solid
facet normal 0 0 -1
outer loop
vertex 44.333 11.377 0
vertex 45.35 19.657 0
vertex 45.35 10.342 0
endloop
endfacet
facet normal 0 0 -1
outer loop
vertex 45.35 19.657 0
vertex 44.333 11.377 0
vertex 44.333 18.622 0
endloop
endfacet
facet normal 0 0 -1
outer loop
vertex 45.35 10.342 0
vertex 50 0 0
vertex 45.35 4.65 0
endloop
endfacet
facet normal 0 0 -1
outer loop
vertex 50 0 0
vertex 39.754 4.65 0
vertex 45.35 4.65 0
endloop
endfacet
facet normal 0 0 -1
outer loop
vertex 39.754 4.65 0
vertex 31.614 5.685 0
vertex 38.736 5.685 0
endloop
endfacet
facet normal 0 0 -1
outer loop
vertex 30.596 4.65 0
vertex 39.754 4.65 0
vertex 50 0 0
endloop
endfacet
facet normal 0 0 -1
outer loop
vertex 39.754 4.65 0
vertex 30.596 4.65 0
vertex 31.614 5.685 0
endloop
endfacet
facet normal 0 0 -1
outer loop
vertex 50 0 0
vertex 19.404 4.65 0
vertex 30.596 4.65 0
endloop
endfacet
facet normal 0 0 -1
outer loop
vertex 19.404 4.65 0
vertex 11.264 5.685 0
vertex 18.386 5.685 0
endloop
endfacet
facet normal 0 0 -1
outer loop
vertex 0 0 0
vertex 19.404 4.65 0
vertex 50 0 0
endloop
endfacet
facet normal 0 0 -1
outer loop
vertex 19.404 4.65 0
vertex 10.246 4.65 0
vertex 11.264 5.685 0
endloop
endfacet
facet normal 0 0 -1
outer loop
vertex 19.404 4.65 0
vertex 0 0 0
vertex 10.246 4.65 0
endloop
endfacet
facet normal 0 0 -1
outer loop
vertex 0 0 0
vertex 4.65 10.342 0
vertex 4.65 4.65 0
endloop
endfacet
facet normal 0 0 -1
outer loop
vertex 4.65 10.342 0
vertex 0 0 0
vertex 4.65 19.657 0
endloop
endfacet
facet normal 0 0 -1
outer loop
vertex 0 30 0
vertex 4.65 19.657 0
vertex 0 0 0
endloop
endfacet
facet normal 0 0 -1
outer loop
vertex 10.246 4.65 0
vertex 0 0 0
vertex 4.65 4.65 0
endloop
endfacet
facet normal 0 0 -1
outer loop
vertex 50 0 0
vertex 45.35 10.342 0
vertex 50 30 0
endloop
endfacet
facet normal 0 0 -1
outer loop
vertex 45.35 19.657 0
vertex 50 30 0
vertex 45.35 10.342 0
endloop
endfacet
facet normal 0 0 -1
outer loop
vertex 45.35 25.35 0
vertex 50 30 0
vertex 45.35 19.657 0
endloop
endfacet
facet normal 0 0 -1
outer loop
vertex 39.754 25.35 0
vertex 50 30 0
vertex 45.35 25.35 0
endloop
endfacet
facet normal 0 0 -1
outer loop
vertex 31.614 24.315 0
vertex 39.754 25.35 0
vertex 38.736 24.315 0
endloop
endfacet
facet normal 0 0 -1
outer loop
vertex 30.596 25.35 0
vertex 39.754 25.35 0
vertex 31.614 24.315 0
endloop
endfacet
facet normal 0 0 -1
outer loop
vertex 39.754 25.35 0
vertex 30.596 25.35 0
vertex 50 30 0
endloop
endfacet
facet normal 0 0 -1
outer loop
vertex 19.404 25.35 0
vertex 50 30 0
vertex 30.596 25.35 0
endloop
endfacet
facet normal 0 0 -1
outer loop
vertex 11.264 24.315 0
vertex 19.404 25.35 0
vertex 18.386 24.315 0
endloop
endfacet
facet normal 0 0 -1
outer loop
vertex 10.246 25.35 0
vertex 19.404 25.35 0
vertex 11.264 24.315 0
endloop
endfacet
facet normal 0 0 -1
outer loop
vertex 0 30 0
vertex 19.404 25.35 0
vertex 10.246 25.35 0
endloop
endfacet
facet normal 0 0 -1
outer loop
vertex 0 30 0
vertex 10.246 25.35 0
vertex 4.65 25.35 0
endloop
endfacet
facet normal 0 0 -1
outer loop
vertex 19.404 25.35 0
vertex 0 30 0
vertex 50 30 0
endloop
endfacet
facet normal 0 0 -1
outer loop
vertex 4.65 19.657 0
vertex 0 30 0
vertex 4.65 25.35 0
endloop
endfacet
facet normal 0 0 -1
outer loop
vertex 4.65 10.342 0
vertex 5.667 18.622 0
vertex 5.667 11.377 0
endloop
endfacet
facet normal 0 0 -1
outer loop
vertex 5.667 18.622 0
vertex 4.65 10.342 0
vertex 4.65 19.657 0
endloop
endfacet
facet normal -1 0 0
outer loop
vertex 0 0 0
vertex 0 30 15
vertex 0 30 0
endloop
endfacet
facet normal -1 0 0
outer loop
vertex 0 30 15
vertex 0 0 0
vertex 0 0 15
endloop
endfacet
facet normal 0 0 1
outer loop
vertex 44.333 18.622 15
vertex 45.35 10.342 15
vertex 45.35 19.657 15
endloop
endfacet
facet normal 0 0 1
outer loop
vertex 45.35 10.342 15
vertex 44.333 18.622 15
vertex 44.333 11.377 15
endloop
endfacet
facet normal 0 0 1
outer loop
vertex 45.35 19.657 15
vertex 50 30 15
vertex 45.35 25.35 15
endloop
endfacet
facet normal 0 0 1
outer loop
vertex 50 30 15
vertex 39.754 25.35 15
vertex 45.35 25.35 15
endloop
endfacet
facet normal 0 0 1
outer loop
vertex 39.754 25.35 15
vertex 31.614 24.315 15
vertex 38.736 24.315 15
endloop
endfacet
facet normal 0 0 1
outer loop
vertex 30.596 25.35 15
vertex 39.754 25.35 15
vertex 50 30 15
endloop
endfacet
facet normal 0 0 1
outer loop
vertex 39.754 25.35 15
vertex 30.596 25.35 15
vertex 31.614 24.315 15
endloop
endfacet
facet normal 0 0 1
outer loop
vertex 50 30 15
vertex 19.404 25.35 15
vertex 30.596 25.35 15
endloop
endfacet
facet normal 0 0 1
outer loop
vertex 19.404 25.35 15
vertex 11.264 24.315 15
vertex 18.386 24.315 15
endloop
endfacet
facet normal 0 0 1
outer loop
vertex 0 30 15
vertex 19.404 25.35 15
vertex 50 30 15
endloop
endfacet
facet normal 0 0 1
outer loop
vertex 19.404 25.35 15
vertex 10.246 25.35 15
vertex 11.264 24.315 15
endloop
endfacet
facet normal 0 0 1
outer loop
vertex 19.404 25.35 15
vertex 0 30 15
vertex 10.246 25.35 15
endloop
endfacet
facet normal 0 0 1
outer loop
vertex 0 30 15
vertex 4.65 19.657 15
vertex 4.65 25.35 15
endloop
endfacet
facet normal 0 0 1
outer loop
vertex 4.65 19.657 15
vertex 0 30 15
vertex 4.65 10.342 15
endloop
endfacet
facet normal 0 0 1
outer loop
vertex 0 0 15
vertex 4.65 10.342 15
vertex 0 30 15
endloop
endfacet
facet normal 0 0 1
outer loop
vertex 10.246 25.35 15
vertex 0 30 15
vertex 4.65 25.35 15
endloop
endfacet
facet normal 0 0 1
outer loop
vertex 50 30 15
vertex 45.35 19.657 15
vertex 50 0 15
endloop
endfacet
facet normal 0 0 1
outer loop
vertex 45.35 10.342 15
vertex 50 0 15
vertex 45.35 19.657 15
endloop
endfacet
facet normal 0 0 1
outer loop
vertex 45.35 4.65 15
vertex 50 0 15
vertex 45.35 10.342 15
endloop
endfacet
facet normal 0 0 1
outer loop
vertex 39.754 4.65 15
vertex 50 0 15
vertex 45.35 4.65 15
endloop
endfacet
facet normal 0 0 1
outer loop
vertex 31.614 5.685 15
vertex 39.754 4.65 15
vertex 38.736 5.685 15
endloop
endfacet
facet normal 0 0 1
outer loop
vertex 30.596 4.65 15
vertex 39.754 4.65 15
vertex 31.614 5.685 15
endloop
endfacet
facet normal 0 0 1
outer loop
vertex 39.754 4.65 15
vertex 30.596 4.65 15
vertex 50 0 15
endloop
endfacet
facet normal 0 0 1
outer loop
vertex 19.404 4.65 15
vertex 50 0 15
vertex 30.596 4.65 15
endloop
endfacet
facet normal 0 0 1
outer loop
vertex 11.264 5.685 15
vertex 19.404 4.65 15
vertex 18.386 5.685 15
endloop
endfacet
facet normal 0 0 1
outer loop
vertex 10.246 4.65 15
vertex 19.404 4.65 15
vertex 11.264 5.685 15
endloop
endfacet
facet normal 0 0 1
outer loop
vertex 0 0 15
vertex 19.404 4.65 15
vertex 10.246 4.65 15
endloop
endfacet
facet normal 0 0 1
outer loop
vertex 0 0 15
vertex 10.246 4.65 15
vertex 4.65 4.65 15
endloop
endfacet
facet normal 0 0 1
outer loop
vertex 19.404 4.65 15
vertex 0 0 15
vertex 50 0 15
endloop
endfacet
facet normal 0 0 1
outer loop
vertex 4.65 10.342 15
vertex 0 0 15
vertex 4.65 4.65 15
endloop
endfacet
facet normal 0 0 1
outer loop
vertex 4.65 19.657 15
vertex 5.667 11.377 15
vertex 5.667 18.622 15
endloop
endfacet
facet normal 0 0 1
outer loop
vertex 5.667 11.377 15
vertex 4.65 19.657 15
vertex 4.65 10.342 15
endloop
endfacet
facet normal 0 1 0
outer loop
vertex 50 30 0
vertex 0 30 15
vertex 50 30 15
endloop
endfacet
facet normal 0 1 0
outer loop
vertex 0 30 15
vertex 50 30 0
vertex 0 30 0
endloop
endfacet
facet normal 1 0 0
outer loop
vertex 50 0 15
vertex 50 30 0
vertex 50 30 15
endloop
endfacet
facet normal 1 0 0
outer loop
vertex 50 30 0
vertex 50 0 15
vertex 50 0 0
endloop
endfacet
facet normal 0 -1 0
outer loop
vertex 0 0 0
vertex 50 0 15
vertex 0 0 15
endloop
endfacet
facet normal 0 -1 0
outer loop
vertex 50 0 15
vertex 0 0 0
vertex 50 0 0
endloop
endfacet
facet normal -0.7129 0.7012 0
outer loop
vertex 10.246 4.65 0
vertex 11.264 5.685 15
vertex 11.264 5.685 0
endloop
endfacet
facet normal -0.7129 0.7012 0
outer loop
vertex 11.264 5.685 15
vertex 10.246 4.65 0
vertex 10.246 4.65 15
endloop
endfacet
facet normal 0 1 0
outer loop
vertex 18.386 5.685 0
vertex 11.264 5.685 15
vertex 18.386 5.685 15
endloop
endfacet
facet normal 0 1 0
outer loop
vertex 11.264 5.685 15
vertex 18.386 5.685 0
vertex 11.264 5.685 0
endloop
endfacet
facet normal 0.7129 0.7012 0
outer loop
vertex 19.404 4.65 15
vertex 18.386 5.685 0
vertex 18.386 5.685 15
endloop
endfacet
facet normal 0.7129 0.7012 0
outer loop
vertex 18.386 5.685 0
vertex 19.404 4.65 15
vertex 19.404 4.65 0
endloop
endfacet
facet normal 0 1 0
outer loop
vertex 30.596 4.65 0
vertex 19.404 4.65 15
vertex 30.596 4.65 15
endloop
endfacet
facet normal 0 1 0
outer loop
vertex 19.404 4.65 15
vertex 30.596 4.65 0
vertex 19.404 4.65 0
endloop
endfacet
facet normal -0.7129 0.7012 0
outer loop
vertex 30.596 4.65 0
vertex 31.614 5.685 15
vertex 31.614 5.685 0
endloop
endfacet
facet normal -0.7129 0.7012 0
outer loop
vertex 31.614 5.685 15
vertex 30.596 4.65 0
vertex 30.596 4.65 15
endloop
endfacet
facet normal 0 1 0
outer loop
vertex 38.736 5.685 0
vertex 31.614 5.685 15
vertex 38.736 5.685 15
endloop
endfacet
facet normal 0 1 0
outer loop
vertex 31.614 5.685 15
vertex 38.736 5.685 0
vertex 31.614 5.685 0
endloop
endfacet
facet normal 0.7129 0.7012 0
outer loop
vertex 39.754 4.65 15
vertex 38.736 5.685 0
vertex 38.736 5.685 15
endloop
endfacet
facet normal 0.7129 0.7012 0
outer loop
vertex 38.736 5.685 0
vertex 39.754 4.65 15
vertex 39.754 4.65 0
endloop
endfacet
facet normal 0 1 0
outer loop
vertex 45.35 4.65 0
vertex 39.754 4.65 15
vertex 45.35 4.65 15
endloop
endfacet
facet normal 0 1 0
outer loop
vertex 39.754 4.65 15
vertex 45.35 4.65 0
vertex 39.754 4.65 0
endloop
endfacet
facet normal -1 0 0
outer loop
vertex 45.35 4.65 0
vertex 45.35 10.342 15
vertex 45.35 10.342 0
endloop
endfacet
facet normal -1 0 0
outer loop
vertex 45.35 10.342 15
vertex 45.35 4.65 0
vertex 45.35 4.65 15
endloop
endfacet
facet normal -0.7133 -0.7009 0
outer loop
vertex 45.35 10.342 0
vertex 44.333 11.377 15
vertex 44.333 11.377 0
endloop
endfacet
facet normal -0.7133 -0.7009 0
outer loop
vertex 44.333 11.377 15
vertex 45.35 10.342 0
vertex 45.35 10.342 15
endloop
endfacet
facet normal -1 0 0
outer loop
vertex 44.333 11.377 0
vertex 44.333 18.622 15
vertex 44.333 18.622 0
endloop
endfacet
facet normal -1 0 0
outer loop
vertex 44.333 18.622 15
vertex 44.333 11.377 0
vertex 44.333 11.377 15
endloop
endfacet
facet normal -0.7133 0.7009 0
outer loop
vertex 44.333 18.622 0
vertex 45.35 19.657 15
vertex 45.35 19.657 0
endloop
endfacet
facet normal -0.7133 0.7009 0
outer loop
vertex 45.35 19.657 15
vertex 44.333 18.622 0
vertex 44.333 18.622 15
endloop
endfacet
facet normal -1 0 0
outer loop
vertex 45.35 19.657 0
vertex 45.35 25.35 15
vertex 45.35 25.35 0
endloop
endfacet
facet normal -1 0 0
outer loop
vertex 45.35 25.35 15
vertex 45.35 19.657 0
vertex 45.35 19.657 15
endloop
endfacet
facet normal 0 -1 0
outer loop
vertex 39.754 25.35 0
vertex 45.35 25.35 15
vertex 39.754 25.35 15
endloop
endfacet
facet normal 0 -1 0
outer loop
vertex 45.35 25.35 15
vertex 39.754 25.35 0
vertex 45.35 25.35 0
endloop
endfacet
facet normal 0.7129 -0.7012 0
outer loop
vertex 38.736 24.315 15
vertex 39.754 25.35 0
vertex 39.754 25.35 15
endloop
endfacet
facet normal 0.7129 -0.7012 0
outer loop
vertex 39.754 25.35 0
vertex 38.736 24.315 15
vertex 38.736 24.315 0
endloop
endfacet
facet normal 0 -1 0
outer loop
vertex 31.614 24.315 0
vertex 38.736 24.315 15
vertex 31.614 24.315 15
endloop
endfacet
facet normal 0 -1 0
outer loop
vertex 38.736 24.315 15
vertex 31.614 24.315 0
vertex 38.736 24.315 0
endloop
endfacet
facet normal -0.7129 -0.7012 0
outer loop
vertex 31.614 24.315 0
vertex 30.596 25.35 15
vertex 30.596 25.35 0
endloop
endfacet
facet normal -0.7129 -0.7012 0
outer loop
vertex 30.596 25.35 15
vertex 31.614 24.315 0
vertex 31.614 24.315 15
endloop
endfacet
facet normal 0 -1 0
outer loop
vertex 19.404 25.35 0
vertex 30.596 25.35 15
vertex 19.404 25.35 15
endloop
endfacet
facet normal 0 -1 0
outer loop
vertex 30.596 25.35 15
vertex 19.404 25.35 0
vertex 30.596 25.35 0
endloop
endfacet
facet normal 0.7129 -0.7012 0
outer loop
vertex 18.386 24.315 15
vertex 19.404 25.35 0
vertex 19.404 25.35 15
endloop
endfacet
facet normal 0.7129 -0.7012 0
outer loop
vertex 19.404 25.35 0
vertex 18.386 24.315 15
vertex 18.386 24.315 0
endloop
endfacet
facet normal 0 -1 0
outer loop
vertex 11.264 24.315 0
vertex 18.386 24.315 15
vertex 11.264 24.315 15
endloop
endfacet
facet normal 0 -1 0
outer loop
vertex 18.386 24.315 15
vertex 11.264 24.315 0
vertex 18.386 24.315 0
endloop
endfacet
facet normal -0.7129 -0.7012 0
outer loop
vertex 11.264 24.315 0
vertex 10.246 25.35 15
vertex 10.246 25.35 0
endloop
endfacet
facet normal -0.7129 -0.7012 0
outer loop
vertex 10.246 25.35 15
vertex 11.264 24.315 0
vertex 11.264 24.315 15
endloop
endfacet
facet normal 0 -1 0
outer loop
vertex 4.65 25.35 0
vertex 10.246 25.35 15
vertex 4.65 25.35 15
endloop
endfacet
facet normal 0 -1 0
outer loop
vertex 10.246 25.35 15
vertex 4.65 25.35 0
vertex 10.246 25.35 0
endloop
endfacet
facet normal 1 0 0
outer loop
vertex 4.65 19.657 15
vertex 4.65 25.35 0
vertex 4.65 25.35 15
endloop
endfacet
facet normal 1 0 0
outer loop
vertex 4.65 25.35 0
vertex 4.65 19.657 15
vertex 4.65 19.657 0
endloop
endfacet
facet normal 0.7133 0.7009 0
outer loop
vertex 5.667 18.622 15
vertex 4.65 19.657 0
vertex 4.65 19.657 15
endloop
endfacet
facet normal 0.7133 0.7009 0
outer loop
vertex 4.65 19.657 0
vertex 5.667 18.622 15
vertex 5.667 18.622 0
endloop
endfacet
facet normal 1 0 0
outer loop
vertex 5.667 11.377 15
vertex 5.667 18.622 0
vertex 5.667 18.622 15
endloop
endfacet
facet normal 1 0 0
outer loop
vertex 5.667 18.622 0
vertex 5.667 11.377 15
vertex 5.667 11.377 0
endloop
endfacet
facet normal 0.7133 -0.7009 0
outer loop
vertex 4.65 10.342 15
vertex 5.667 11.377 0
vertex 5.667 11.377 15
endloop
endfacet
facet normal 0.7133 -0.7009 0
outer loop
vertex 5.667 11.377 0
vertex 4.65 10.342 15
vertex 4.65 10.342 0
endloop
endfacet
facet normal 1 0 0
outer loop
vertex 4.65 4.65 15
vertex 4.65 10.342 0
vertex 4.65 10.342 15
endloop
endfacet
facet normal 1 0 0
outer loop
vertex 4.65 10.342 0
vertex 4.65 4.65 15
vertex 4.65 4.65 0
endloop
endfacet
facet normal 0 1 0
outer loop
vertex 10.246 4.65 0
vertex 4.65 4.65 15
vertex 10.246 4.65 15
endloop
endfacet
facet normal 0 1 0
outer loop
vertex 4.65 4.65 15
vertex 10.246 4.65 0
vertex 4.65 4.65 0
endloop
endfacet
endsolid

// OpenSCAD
// file: constants.scad
tolerance=0.7;
oversize = 0.7;
lengthHoleSpacing=20;
wallWidth=5;
vslotIndentHeight=1;
sectionWidth=20;
profileSize=20;
sectionCountWidth = 2;
sectionCountDepth = 1;
extrusionWidth=profileSize*sectionCountWidth;
extrusionDepth=profileSize*sectionCountDepth;
nema17Width = 42.3;
nema17HoleRadius = 11.05 + tolerance/2;
nema17Height = 3.5*extrusionWidth;
nema17BoltSpacing = 31;
nema17BeltHoleHeight = 8;
nema17BeltOffsetFromTopExtrusion = 8;
nema17BeltHeightWidth = 15;
wallSpacing=5;
screwHeight = wallSpacing+vslotIndentHeight;
// main file
include<constants.scad>;

testPiece=true;
if (testPiece) {
    zExtrusionLength = 15;
    zExtrusionWidthSections = 2;
    zExtrusionDepthSections = 1;
    difference() {
        linear_extrude(height=zExtrusionLength)
            square([
                sectionWidth*zExtrusionWidthSections+wallWidth*2,
                sectionWidth*zExtrusionDepthSections+wallWidth*2
            ]);
        translate([wallWidth, wallWidth, 0]) {
            linear_extrude(height=zExtrusionLength)
            VSlot2dProfile(
                sectionCountWidth=zExtrusionWidthSections, 
                sectionCountDepth=zExtrusionDepthSections,
                indentHeight=vslotIndentHeight,
                oversize=oversize
            );
        }; 
        /*
        negativeSpaceHoles(
            extrusionLength=zExtrusionLength,
            fullIndentHeight=wallWidth+vslotIndentHeight,
            firstIndentOffset=wallWidth,
            widthSections=zExtrusionWidthSections,
            lengthHoleSpacing=lengthHoleSpacing
        );*/        
    };
}

module extrusionIndent(_indentWidthInside, _indentWidthOutside, _indentHeight) {
    polygon(points=[
            [0,0], 
            [(_indentWidthOutside-_indentWidthInside)/2, _indentHeight], 
            [_indentWidthInside + (_indentWidthOutside-_indentWidthInside)/2, _indentHeight],
            [_indentWidthOutside, 0]
        ]);
};

module VSlot2dProfile(
    extrusionLength,
    sectionWidth = 20,
    indentWidthOutside = 9,
    indentWidthInside = 7,
    indentHeight = vslotIndentHeight,
    sectionCountWidth,
    sectionCountDepth,
    topIndent = true,
    bottomIndent = true,
    leftIndent = true,
    rightIndent = true,
    oversize = 0
)
{
    translate([-oversize/2,-oversize/2,-oversize/2])
    resize([
        sectionWidth*sectionCountWidth+oversize,
        sectionWidth*sectionCountDepth+oversize,
        extrusionLength+oversize
    ]) difference() {
        
            square(
                size=[
                    sectionWidth*sectionCountWidth, 
                    sectionWidth*sectionCountDepth
                ]
            );
        for(i = [0:sectionCountWidth]) {
            // bottom indents
            if (bottomIndent) 
                translate([i * sectionWidth + (sectionWidth-indentWidthOutside)/2, 0, 0])
                extrusionIndent(indentWidthInside,indentWidthOutside,indentHeight);
            
            // top indents
            if (topIndent)
                translate([
                    i * sectionWidth + (sectionWidth-indentWidthOutside)/2, 
                    sectionWidth*sectionCountDepth, 
                    0
                ])
                rotate([180,0,0])
                extrusionIndent(indentWidthInside,indentWidthOutside,indentHeight);
        }
        for(i = [0:sectionCountDepth]) {
            // left side indent
            if (leftIndent)
                translate([0, (i+1) * sectionWidth - (sectionWidth-indentWidthOutside)/2, 0])
                rotate([0,0,-90]) 
                extrusionIndent(indentWidthInside,indentWidthOutside,indentHeight);
            
            // right side inden
            if (rightIndent)
                translate([
                    sectionWidth*sectionCountWidth, 
                    i * sectionWidth + (sectionWidth-indentWidthOutside)/2, 
                    0
                ])
                rotate([0,0,90]) 
                extrusionIndent(indentWidthInside,indentWidthOutside,indentHeight);
        }
    }
};


module negativeSpaceHole(
    largeHoleIndent = largeHoleIndent,
    fullIndentHeight = wallSpacing+vslotIndentHeight,
    largeHoleRadius = 5,
    smallHoleRadius = 2.5,
    )
{ 
    cylinder(h=largeHoleHeight,r=largeHoleRadius,center=false, $fn=90);
    cylinder(h=fullIndentHeight,r=smallHoleRadius,center=false, $fn=90);
}

module negativeSpaceHolePoints(
    largeHoleIndent = 1,
    largeHoleRadius = 5,
    smallHoleRadius = 2.5,
    fullIndentHeight,
    points = []
    )
{
    for (i=[0:len(points)-1]){
        translate([points[i][1],0,points[i][0]]) {
            rotate([-90,0,0]) {
                echo(points[i][0], points[i][1]);
                negativeSpaceHole(
                    largeHoleHeight=largeHoleIndent,
                    fullIndentHeight=fullIndentHeight,
                    largeHoleRadius=largeHoleRadius,
                    smallHoleRadius=smallHoleRadius);
            };
        }
    }
}

module negativeSpaceHoles(
    largeHoleIndent = 1,
    largeHoleRadius = 5,
    smallHoleRadius = 2.5,
    widthHoleSpacing = 20,
    fullIndentHeight,
    lengthHoleSpacing,
    extrusionLength,
    firstIndentOffset,
    widthSections
    ) 
{
    
    negativeSpaceHolePoints(
        largeHoleIndent = largeHoleIndent,
        largeHoleRadius = largeHoleRadius,
        smallHoleRadius = smallHoleRadius,
        fullIndentHeight = fullIndentHeight,
        lengthHoleSpacing = lengthHoleSpacing,
        widthSections = widthSections,
        points=[ 
            for (p = [lengthHoleSpacing/2+firstIndentOffset:lengthHoleSpacing:extrusionLength-firstIndentOffset-lengthHoleSpacing/2]) 
            for (s = [firstIndentOffset+widthHoleSpacing/2:widthHoleSpacing:widthHoleSpacing*widthSections]) 
            [p,s]
         ]
            
    );
}


module drawVslotExtrusion(
    height, 
    sectionCountWidth, 
    sectionCountDepth, 
    topIndent=true, 
    rightIndent=true, 
    leftIndent=true, 
    bottomIndent=true, 
    oversize=0,
    screwHeight=screwHeight,
    screwOffset=0,
    leftScrewPoints = [],
    rightScrewPoints = [], 
    topScrewPoints = [],
    bottomScrewPoints = [],
    backScrewPoints = []
    ) 
{
    linear_extrude(height=height) 
        VSlot2dProfile(
            sectionCountWidth=sectionCountWidth,
            sectionCountDepth=sectionCountDepth,
            topIndent=topIndent,
            bottomIndent= bottomIndent,
            leftIndent=leftIndent,
            rightIndent=rightIndent,
            oversize=oversize);
    
    if (len(topScrewPoints) > 0) {
        points = [ 
            for(i = [0:len(topScrewPoints)-1])
            for(j=[profileSize/2:profileSize:sectionCountWidth*profileSize])
            [topScrewPoints[i],j]
        ];
            translate([0,-screwHeight+vslotIndentHeight,0])
        negativeSpaceHolePoints(
            largeHoleIndent = screwHeight-screwOffset,
            fullIndentHeight=screwHeight,
            points = points
        );
    };
    if (len(bottomScrewPoints) > 0) {
        points = [ 
            for(i = [0:len(bottomScrewPoints)-1])
            for(j=[profileSize/2:profileSize:sectionCountWidth*profileSize])
            [height-bottomScrewPoints[i],j]
        ];
            translate([0,screwHeight+sectionCountDepth*profileSize-vslotIndentHeight,height])
            rotate([180,0,0])
        negativeSpaceHolePoints(
            largeHoleIndent = screwHeight-screwOffset,
            fullIndentHeight=screwHeight+oversize,
            points = points
        );
    };
    if (len(leftScrewPoints) > 0) {
        points = [ 
            for(i = [0:len(leftScrewPoints)-1])
            for(j=[profileSize/2:profileSize:sectionCountDepth*profileSize])
            [leftScrewPoints[i],j]
        ];
            translate([-screwHeight+vslotIndentHeight,sectionCountDepth*profileSize,0])
            rotate([0,0,-90])
        negativeSpaceHolePoints(
            largeHoleIndent = screwHeight-screwOffset,
            fullIndentHeight=screwHeight+oversize,
            points = points
        );
    };
    if (len(rightScrewPoints) > 0) {
        points = [ 
            for(i = [0:len(rightScrewPoints)-1])
            for(j=[profileSize/2:profileSize:sectionCountDepth*profileSize])
            [rightScrewPoints[i],j]
        ];
            translate([sectionCountWidth*profileSize+screwHeight-vslotIndentHeight,0,0])
            rotate([0,0,90])
        negativeSpaceHolePoints(
            largeHoleIndent = screwHeight-screwOffset,
            fullIndentHeight=screwHeight+oversize,
            points = points
        );
    };
    if (len(backScrewPoints) > 0) {
        points = [ 
            for(i = [0:len(backScrewPoints)-1])
            for(j=[profileSize/2:profileSize:sectionCountWidth*profileSize])
            [backScrewPoints[i],j]
        ];
            translate([0,sectionCountDepth*profileSize,-screwHeight+vslotIndentHeight])
            rotate([90,0,0])
        negativeSpaceHolePoints(
            largeHoleIndent = screwHeight-screwOffset,
            fullIndentHeight=screwHeight,
            points = points
        );
    };
    /*
        translate([profileSize/2,0,0])
        for(i = [0:len(leftScrewPoints)])
        for(j=[0:profileSize:sectionCountDepth*profileSize]) {
            translate([0,leftScrewPoints[i]],j) 
                negativeSpaceHole(largeHoleHeight = screwHeight-screwOffset, fullIndentHeight = screwHeight);
            }
    */
}


        
